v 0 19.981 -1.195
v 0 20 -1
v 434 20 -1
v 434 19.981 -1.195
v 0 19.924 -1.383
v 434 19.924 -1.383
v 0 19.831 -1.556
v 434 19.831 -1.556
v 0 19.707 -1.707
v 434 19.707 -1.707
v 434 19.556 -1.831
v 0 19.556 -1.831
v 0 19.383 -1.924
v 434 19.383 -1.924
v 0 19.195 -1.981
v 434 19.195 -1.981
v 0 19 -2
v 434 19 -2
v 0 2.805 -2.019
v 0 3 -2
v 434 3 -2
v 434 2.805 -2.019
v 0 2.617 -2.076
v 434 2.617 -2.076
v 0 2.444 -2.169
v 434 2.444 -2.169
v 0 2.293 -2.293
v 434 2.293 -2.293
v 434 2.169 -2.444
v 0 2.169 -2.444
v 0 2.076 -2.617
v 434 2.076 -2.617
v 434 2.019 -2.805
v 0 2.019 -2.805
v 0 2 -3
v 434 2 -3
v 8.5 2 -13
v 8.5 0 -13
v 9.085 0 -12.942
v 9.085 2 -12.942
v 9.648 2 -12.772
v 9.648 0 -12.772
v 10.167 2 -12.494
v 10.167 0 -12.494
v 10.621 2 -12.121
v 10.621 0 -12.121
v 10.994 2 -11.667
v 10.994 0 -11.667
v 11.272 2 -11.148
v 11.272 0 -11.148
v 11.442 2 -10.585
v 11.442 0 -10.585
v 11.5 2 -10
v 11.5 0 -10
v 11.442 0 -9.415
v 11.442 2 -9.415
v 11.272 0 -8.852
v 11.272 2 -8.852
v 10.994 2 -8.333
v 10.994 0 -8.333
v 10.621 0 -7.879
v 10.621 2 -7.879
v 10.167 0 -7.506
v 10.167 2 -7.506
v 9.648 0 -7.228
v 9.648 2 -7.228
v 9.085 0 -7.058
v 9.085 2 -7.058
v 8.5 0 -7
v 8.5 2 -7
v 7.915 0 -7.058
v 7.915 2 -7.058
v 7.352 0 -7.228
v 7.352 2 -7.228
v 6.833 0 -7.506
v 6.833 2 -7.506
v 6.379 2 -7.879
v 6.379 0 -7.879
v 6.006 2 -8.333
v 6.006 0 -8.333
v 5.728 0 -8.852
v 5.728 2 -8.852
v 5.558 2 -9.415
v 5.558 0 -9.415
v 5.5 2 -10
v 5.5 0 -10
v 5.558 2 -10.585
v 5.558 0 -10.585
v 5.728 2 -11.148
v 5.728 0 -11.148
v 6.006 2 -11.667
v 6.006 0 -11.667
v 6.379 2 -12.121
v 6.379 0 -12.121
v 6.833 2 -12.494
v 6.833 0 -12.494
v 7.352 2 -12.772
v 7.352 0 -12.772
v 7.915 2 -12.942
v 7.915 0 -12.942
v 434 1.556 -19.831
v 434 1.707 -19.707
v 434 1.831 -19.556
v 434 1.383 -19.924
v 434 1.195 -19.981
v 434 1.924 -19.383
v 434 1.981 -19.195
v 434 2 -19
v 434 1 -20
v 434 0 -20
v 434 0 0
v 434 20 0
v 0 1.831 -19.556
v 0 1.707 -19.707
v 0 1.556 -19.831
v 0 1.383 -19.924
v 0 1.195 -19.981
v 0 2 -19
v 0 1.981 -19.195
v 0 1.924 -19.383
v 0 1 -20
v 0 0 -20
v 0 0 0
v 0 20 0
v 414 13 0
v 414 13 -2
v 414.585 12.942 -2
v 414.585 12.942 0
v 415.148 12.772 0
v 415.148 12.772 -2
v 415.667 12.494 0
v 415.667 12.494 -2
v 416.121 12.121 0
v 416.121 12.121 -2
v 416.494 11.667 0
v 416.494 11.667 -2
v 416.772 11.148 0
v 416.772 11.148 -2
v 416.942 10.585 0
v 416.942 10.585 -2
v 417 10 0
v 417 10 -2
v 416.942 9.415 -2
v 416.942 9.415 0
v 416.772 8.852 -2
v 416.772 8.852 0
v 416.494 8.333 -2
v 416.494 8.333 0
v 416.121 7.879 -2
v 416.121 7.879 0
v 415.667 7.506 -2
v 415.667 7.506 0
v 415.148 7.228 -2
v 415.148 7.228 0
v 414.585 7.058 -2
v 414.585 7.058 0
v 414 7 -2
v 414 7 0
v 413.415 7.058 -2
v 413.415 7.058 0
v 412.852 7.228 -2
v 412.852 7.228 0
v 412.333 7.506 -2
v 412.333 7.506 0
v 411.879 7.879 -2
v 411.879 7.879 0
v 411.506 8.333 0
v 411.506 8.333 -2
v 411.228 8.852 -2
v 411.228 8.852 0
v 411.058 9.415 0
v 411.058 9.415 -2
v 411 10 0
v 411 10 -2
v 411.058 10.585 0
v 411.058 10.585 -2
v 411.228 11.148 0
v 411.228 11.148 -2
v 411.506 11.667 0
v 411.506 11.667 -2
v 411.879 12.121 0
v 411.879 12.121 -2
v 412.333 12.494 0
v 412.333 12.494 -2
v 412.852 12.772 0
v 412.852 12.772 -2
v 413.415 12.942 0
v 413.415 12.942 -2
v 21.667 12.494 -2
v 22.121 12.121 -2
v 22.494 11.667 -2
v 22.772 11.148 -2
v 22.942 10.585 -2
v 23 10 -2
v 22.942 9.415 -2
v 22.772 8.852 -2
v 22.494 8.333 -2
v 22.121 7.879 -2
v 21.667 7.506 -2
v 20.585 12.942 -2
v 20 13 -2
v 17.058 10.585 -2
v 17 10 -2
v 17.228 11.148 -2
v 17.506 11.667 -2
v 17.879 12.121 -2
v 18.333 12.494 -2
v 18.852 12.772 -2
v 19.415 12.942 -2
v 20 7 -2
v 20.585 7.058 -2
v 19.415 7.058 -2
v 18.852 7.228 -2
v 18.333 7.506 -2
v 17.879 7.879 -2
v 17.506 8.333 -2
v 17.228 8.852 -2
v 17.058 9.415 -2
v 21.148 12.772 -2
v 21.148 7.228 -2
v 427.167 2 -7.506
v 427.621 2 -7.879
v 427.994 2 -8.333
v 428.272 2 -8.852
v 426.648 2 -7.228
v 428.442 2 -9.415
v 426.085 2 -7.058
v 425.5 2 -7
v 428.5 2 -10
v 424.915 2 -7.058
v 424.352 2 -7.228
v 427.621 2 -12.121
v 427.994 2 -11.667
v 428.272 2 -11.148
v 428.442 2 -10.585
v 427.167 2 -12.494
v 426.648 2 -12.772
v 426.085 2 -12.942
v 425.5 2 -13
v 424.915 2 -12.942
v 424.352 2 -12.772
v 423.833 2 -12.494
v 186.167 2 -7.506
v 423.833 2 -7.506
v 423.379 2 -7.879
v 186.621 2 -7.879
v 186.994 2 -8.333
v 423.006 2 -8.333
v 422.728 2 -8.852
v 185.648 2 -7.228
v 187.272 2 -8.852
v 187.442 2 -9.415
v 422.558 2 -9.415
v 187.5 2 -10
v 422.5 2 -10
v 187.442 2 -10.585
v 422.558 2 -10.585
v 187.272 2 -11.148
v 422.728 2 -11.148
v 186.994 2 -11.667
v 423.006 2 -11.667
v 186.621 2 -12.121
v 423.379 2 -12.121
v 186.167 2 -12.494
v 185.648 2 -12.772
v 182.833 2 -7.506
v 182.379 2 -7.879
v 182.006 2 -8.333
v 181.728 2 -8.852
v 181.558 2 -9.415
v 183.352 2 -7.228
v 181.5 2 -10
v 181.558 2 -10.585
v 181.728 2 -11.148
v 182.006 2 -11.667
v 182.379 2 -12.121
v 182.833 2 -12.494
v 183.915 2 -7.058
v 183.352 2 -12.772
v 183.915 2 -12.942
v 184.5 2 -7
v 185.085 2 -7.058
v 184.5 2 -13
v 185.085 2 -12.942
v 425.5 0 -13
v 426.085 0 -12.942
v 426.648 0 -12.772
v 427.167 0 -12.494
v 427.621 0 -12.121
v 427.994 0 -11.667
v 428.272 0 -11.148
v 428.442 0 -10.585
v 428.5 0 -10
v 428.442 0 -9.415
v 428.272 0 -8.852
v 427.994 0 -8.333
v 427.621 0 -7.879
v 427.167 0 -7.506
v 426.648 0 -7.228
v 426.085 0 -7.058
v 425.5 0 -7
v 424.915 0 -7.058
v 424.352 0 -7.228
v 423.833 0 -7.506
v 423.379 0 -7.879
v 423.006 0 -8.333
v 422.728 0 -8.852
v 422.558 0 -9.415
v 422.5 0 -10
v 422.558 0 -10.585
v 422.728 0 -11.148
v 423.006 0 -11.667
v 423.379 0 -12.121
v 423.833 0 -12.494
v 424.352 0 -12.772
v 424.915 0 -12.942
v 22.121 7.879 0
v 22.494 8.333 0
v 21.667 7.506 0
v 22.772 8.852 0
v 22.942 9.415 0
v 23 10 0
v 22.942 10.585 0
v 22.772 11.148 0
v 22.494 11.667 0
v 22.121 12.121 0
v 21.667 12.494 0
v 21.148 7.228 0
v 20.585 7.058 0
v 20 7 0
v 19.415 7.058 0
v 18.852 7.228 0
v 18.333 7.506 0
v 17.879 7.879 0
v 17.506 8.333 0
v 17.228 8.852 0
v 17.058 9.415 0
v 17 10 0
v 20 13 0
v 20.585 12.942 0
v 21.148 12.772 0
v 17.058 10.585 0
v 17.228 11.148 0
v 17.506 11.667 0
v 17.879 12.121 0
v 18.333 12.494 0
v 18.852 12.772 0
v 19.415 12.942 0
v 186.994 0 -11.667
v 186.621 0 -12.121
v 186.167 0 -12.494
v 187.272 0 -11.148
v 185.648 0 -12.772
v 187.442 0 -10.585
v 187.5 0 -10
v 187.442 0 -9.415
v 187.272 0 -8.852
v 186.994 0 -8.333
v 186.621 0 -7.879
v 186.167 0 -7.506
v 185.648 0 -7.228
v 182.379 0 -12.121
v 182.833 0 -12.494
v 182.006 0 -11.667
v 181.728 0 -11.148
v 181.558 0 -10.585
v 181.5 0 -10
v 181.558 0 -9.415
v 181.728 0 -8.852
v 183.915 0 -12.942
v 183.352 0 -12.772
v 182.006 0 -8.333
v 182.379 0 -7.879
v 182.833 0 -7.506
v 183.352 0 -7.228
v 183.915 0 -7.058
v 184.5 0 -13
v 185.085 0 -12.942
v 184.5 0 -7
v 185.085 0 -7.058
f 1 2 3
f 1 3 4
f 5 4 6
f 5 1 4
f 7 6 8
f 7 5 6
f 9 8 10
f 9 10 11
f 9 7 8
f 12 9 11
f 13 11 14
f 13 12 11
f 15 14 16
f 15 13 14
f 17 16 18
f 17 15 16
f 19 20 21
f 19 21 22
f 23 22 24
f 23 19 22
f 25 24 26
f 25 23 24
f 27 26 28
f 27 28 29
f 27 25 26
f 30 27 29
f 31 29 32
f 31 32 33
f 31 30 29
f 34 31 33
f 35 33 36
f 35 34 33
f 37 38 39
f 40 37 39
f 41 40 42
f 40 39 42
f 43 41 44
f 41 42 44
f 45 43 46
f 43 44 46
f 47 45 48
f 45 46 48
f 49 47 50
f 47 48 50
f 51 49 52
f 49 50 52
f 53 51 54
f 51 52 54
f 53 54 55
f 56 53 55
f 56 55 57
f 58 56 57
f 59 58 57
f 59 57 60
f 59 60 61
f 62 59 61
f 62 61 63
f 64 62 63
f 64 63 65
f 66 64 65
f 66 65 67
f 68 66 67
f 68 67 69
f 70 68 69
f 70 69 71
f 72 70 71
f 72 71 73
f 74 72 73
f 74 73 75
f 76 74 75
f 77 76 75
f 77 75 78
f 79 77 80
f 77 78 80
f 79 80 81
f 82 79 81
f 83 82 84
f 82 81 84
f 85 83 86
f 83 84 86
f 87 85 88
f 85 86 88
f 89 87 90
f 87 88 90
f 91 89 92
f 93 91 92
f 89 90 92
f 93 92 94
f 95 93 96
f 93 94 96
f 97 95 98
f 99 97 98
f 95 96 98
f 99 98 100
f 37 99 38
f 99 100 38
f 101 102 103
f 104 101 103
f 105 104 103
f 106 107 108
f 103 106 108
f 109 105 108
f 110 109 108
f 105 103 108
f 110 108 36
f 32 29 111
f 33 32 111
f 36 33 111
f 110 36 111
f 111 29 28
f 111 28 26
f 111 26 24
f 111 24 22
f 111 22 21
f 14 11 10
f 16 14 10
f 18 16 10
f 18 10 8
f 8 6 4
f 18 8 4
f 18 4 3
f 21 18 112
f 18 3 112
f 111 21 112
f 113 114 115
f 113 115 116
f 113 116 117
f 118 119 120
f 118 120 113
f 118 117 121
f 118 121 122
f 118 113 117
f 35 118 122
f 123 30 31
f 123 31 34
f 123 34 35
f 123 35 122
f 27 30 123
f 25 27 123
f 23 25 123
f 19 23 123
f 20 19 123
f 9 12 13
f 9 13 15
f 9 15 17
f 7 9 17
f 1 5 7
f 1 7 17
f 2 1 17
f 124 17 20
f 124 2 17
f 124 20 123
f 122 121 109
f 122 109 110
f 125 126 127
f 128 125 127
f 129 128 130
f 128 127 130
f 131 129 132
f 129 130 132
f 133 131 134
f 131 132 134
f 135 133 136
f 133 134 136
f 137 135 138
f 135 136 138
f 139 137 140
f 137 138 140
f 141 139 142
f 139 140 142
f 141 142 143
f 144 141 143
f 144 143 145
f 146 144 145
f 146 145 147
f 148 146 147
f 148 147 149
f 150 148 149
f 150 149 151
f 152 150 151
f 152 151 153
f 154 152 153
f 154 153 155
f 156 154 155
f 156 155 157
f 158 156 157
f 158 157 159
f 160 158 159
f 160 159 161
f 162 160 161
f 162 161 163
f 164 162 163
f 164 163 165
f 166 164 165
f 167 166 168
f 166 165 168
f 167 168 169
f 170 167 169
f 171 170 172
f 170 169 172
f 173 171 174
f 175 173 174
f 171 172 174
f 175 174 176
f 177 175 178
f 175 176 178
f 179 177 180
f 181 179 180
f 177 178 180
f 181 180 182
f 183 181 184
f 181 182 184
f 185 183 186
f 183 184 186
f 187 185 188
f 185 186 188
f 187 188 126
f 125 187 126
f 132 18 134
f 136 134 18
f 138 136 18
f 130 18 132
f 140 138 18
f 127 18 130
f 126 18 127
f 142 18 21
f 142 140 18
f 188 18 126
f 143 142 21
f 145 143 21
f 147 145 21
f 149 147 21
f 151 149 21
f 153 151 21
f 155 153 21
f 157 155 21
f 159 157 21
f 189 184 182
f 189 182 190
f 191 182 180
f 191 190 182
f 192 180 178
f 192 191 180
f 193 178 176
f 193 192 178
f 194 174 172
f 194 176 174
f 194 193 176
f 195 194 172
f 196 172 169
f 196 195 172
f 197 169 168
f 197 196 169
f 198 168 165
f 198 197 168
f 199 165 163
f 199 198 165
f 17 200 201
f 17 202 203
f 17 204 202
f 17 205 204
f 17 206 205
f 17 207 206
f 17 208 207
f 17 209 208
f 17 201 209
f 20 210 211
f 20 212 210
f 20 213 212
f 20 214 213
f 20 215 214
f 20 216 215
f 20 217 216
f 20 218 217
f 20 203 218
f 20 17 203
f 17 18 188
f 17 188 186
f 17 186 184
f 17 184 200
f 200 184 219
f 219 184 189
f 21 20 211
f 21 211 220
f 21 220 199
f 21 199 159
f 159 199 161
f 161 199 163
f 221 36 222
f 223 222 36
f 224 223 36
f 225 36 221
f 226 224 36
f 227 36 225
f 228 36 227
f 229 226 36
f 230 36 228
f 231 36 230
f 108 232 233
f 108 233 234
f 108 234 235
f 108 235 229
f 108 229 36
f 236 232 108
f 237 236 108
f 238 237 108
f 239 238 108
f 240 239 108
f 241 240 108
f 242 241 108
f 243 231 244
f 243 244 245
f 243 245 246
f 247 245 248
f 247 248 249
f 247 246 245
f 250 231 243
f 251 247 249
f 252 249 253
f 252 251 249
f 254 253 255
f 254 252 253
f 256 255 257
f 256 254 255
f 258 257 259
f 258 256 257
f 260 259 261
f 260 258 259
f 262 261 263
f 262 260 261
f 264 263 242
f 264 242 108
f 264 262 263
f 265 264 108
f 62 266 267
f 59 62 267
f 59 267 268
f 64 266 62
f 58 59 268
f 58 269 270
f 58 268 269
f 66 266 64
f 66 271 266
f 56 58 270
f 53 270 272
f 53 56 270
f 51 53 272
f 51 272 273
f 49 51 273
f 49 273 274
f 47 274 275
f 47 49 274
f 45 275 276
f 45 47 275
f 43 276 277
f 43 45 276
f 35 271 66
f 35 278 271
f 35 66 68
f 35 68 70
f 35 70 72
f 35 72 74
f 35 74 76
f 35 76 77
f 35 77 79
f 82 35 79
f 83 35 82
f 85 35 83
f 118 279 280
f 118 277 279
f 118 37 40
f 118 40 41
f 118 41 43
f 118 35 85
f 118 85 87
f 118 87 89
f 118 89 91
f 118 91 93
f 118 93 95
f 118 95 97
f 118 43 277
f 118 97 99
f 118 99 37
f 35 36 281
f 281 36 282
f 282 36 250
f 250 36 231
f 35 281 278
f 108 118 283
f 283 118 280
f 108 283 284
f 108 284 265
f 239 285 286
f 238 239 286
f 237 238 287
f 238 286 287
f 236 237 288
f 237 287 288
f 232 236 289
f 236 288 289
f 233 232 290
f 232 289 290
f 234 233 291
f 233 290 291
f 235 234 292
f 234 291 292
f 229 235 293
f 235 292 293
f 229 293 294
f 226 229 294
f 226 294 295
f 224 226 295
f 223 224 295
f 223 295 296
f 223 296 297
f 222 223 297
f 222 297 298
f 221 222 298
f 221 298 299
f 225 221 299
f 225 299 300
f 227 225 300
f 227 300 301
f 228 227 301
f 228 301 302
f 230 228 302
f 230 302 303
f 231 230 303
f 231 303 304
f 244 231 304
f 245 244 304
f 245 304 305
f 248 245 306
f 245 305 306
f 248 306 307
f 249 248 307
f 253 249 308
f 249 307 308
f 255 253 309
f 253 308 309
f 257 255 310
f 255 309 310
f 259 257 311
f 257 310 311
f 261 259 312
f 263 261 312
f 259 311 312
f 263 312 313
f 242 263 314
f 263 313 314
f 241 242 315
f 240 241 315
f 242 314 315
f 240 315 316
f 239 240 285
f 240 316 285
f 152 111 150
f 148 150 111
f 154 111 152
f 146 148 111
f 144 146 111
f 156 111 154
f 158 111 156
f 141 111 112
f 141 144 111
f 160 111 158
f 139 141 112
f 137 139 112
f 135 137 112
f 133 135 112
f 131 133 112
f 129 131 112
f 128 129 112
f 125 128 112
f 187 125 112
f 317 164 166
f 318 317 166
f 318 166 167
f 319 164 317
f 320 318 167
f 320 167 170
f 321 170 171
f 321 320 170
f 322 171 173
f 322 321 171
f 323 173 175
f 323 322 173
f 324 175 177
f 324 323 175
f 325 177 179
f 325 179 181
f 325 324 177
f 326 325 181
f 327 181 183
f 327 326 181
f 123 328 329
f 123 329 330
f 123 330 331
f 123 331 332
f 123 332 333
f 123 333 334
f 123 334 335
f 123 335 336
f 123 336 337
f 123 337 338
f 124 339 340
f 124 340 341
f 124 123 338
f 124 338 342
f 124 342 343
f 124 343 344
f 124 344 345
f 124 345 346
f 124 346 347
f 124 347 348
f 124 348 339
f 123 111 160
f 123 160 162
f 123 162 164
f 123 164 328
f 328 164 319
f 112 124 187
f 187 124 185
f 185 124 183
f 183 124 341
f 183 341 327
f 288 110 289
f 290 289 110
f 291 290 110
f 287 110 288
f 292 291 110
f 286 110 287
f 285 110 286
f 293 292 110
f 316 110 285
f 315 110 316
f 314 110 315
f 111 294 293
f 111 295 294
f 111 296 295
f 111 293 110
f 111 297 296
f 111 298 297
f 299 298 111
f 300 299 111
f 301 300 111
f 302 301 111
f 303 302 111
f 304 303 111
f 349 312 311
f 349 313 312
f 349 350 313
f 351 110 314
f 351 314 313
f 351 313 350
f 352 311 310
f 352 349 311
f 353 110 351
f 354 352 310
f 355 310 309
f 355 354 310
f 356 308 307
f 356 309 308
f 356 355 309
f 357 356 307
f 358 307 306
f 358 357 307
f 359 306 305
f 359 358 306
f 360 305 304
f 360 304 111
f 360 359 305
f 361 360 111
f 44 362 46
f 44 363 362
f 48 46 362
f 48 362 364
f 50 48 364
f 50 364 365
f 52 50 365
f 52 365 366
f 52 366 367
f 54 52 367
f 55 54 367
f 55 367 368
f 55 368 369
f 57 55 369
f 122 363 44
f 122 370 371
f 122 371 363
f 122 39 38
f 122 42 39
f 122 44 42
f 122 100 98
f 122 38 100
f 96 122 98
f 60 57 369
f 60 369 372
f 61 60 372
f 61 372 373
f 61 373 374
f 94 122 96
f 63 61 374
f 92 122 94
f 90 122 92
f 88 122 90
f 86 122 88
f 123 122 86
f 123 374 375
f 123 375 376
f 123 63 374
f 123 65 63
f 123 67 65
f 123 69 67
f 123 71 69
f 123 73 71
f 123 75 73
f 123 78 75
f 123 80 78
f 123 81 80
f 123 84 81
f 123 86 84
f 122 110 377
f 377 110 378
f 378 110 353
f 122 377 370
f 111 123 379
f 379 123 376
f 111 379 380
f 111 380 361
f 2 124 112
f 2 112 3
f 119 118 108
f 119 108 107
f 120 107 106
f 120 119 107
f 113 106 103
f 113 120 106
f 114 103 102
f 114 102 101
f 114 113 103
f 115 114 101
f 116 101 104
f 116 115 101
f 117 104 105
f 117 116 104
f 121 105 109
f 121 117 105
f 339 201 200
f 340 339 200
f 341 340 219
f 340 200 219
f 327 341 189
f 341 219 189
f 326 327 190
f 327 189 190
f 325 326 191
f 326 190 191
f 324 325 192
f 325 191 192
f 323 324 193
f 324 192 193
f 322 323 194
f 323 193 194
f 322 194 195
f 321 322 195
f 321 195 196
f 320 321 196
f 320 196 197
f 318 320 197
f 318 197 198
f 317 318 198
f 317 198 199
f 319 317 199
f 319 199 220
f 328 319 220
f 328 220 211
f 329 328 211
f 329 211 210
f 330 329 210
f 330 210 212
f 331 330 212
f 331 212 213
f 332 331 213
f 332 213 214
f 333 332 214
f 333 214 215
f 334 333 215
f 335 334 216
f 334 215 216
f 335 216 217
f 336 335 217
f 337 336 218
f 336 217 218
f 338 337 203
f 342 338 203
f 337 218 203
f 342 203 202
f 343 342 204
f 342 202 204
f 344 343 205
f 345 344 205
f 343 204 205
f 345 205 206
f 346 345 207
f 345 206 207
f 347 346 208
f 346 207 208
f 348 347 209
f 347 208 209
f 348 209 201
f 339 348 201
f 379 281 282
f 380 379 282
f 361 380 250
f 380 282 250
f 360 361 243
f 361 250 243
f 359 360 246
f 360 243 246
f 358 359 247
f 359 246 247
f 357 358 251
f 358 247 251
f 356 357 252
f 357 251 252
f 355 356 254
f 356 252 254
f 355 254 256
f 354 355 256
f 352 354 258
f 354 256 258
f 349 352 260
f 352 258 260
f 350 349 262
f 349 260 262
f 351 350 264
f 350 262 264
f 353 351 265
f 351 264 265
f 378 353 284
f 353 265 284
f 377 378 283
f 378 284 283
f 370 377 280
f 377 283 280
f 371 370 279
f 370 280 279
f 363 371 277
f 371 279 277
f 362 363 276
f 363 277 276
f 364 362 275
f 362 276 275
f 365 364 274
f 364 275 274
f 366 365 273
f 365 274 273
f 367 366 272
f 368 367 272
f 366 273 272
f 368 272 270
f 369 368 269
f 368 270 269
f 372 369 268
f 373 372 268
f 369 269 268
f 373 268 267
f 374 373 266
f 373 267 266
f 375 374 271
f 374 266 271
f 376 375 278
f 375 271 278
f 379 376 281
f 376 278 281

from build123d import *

# Parameters (mm, degrees)
EXTRUDE_1_DEPTH     = 434
SKETCH_2_R          = 3
CUT_EXTRUDE_1_DEPTH = 435.920682424
SKETCH_3_R          = 3
CUT_EXTRUDE_2_DEPTH = 435.833301393
SKETCH_5_R          = 3
CUT_EXTRUDE_4_DEPTH = 2


with BuildPart() as part:
    # Эскиз1 → Бобышка-Вытянуть1 (new body)
    with BuildSketch(Plane(origin=(0, 0, 0), x_dir=(0, 0, -1), z_dir=(1, 0, 0))):
        with BuildLine():
            Line((0, 0), (0, 20))
            Line((0, 20), (1, 20))
            ThreePointArc((1, 20), (1.707106781, 19.707106781), (2, 19))
            Line((2, 19), (2, 3))
            ThreePointArc((2, 3), (2.292893219, 2.292893219), (3, 2))
            Line((3, 2), (19, 2))
            ThreePointArc((19, 2), (19.707106781, 1.707106781), (20, 1))
            Line((20, 1), (20, 0))
            Line((20, 0), (0, 0))
        make_face()
    extrude(amount=EXTRUDE_1_DEPTH)

    # Эскиз2 → Вырез-Вытянуть1 (cut, through all)
    with BuildSketch(Plane.XZ):
        with Locations(Location((425.5, -10, 0), (0, 0, 270))):
            Circle(SKETCH_2_R)
        with Locations(Location((8.5, -10, 0), (0, 0, 270))):
            Circle(SKETCH_2_R)
    extrude(amount=-CUT_EXTRUDE_1_DEPTH, mode=Mode.SUBTRACT)

    # Эскиз3 → Вырез-Вытянуть2 (cut, through all)
    with BuildSketch(Plane(origin=(0, 0, -2), x_dir=(-1, 0, 0), z_dir=(0, 0, -1))):
        with Locations(Location((-414, 10, 0), (0, 0, 90))):
            Circle(SKETCH_3_R)
        with Locations(Location((-20, 10, 0), (0, 0, 90))):
            Circle(SKETCH_3_R)
    extrude(amount=-CUT_EXTRUDE_2_DEPTH, mode=Mode.SUBTRACT)

    # Эскиз5 → Вырез-Вытянуть4 (cut)
    with BuildSketch(Plane(origin=(0, 2, 0), x_dir=(1, 0, 0), z_dir=(0, 1, 0))):
        with Locations(Location((184.5, 10, 0), (0, 0, 270))):
            Circle(SKETCH_5_R)
    extrude(amount=-CUT_EXTRUDE_4_DEPTH, mode=Mode.SUBTRACT)


solid = part.part
